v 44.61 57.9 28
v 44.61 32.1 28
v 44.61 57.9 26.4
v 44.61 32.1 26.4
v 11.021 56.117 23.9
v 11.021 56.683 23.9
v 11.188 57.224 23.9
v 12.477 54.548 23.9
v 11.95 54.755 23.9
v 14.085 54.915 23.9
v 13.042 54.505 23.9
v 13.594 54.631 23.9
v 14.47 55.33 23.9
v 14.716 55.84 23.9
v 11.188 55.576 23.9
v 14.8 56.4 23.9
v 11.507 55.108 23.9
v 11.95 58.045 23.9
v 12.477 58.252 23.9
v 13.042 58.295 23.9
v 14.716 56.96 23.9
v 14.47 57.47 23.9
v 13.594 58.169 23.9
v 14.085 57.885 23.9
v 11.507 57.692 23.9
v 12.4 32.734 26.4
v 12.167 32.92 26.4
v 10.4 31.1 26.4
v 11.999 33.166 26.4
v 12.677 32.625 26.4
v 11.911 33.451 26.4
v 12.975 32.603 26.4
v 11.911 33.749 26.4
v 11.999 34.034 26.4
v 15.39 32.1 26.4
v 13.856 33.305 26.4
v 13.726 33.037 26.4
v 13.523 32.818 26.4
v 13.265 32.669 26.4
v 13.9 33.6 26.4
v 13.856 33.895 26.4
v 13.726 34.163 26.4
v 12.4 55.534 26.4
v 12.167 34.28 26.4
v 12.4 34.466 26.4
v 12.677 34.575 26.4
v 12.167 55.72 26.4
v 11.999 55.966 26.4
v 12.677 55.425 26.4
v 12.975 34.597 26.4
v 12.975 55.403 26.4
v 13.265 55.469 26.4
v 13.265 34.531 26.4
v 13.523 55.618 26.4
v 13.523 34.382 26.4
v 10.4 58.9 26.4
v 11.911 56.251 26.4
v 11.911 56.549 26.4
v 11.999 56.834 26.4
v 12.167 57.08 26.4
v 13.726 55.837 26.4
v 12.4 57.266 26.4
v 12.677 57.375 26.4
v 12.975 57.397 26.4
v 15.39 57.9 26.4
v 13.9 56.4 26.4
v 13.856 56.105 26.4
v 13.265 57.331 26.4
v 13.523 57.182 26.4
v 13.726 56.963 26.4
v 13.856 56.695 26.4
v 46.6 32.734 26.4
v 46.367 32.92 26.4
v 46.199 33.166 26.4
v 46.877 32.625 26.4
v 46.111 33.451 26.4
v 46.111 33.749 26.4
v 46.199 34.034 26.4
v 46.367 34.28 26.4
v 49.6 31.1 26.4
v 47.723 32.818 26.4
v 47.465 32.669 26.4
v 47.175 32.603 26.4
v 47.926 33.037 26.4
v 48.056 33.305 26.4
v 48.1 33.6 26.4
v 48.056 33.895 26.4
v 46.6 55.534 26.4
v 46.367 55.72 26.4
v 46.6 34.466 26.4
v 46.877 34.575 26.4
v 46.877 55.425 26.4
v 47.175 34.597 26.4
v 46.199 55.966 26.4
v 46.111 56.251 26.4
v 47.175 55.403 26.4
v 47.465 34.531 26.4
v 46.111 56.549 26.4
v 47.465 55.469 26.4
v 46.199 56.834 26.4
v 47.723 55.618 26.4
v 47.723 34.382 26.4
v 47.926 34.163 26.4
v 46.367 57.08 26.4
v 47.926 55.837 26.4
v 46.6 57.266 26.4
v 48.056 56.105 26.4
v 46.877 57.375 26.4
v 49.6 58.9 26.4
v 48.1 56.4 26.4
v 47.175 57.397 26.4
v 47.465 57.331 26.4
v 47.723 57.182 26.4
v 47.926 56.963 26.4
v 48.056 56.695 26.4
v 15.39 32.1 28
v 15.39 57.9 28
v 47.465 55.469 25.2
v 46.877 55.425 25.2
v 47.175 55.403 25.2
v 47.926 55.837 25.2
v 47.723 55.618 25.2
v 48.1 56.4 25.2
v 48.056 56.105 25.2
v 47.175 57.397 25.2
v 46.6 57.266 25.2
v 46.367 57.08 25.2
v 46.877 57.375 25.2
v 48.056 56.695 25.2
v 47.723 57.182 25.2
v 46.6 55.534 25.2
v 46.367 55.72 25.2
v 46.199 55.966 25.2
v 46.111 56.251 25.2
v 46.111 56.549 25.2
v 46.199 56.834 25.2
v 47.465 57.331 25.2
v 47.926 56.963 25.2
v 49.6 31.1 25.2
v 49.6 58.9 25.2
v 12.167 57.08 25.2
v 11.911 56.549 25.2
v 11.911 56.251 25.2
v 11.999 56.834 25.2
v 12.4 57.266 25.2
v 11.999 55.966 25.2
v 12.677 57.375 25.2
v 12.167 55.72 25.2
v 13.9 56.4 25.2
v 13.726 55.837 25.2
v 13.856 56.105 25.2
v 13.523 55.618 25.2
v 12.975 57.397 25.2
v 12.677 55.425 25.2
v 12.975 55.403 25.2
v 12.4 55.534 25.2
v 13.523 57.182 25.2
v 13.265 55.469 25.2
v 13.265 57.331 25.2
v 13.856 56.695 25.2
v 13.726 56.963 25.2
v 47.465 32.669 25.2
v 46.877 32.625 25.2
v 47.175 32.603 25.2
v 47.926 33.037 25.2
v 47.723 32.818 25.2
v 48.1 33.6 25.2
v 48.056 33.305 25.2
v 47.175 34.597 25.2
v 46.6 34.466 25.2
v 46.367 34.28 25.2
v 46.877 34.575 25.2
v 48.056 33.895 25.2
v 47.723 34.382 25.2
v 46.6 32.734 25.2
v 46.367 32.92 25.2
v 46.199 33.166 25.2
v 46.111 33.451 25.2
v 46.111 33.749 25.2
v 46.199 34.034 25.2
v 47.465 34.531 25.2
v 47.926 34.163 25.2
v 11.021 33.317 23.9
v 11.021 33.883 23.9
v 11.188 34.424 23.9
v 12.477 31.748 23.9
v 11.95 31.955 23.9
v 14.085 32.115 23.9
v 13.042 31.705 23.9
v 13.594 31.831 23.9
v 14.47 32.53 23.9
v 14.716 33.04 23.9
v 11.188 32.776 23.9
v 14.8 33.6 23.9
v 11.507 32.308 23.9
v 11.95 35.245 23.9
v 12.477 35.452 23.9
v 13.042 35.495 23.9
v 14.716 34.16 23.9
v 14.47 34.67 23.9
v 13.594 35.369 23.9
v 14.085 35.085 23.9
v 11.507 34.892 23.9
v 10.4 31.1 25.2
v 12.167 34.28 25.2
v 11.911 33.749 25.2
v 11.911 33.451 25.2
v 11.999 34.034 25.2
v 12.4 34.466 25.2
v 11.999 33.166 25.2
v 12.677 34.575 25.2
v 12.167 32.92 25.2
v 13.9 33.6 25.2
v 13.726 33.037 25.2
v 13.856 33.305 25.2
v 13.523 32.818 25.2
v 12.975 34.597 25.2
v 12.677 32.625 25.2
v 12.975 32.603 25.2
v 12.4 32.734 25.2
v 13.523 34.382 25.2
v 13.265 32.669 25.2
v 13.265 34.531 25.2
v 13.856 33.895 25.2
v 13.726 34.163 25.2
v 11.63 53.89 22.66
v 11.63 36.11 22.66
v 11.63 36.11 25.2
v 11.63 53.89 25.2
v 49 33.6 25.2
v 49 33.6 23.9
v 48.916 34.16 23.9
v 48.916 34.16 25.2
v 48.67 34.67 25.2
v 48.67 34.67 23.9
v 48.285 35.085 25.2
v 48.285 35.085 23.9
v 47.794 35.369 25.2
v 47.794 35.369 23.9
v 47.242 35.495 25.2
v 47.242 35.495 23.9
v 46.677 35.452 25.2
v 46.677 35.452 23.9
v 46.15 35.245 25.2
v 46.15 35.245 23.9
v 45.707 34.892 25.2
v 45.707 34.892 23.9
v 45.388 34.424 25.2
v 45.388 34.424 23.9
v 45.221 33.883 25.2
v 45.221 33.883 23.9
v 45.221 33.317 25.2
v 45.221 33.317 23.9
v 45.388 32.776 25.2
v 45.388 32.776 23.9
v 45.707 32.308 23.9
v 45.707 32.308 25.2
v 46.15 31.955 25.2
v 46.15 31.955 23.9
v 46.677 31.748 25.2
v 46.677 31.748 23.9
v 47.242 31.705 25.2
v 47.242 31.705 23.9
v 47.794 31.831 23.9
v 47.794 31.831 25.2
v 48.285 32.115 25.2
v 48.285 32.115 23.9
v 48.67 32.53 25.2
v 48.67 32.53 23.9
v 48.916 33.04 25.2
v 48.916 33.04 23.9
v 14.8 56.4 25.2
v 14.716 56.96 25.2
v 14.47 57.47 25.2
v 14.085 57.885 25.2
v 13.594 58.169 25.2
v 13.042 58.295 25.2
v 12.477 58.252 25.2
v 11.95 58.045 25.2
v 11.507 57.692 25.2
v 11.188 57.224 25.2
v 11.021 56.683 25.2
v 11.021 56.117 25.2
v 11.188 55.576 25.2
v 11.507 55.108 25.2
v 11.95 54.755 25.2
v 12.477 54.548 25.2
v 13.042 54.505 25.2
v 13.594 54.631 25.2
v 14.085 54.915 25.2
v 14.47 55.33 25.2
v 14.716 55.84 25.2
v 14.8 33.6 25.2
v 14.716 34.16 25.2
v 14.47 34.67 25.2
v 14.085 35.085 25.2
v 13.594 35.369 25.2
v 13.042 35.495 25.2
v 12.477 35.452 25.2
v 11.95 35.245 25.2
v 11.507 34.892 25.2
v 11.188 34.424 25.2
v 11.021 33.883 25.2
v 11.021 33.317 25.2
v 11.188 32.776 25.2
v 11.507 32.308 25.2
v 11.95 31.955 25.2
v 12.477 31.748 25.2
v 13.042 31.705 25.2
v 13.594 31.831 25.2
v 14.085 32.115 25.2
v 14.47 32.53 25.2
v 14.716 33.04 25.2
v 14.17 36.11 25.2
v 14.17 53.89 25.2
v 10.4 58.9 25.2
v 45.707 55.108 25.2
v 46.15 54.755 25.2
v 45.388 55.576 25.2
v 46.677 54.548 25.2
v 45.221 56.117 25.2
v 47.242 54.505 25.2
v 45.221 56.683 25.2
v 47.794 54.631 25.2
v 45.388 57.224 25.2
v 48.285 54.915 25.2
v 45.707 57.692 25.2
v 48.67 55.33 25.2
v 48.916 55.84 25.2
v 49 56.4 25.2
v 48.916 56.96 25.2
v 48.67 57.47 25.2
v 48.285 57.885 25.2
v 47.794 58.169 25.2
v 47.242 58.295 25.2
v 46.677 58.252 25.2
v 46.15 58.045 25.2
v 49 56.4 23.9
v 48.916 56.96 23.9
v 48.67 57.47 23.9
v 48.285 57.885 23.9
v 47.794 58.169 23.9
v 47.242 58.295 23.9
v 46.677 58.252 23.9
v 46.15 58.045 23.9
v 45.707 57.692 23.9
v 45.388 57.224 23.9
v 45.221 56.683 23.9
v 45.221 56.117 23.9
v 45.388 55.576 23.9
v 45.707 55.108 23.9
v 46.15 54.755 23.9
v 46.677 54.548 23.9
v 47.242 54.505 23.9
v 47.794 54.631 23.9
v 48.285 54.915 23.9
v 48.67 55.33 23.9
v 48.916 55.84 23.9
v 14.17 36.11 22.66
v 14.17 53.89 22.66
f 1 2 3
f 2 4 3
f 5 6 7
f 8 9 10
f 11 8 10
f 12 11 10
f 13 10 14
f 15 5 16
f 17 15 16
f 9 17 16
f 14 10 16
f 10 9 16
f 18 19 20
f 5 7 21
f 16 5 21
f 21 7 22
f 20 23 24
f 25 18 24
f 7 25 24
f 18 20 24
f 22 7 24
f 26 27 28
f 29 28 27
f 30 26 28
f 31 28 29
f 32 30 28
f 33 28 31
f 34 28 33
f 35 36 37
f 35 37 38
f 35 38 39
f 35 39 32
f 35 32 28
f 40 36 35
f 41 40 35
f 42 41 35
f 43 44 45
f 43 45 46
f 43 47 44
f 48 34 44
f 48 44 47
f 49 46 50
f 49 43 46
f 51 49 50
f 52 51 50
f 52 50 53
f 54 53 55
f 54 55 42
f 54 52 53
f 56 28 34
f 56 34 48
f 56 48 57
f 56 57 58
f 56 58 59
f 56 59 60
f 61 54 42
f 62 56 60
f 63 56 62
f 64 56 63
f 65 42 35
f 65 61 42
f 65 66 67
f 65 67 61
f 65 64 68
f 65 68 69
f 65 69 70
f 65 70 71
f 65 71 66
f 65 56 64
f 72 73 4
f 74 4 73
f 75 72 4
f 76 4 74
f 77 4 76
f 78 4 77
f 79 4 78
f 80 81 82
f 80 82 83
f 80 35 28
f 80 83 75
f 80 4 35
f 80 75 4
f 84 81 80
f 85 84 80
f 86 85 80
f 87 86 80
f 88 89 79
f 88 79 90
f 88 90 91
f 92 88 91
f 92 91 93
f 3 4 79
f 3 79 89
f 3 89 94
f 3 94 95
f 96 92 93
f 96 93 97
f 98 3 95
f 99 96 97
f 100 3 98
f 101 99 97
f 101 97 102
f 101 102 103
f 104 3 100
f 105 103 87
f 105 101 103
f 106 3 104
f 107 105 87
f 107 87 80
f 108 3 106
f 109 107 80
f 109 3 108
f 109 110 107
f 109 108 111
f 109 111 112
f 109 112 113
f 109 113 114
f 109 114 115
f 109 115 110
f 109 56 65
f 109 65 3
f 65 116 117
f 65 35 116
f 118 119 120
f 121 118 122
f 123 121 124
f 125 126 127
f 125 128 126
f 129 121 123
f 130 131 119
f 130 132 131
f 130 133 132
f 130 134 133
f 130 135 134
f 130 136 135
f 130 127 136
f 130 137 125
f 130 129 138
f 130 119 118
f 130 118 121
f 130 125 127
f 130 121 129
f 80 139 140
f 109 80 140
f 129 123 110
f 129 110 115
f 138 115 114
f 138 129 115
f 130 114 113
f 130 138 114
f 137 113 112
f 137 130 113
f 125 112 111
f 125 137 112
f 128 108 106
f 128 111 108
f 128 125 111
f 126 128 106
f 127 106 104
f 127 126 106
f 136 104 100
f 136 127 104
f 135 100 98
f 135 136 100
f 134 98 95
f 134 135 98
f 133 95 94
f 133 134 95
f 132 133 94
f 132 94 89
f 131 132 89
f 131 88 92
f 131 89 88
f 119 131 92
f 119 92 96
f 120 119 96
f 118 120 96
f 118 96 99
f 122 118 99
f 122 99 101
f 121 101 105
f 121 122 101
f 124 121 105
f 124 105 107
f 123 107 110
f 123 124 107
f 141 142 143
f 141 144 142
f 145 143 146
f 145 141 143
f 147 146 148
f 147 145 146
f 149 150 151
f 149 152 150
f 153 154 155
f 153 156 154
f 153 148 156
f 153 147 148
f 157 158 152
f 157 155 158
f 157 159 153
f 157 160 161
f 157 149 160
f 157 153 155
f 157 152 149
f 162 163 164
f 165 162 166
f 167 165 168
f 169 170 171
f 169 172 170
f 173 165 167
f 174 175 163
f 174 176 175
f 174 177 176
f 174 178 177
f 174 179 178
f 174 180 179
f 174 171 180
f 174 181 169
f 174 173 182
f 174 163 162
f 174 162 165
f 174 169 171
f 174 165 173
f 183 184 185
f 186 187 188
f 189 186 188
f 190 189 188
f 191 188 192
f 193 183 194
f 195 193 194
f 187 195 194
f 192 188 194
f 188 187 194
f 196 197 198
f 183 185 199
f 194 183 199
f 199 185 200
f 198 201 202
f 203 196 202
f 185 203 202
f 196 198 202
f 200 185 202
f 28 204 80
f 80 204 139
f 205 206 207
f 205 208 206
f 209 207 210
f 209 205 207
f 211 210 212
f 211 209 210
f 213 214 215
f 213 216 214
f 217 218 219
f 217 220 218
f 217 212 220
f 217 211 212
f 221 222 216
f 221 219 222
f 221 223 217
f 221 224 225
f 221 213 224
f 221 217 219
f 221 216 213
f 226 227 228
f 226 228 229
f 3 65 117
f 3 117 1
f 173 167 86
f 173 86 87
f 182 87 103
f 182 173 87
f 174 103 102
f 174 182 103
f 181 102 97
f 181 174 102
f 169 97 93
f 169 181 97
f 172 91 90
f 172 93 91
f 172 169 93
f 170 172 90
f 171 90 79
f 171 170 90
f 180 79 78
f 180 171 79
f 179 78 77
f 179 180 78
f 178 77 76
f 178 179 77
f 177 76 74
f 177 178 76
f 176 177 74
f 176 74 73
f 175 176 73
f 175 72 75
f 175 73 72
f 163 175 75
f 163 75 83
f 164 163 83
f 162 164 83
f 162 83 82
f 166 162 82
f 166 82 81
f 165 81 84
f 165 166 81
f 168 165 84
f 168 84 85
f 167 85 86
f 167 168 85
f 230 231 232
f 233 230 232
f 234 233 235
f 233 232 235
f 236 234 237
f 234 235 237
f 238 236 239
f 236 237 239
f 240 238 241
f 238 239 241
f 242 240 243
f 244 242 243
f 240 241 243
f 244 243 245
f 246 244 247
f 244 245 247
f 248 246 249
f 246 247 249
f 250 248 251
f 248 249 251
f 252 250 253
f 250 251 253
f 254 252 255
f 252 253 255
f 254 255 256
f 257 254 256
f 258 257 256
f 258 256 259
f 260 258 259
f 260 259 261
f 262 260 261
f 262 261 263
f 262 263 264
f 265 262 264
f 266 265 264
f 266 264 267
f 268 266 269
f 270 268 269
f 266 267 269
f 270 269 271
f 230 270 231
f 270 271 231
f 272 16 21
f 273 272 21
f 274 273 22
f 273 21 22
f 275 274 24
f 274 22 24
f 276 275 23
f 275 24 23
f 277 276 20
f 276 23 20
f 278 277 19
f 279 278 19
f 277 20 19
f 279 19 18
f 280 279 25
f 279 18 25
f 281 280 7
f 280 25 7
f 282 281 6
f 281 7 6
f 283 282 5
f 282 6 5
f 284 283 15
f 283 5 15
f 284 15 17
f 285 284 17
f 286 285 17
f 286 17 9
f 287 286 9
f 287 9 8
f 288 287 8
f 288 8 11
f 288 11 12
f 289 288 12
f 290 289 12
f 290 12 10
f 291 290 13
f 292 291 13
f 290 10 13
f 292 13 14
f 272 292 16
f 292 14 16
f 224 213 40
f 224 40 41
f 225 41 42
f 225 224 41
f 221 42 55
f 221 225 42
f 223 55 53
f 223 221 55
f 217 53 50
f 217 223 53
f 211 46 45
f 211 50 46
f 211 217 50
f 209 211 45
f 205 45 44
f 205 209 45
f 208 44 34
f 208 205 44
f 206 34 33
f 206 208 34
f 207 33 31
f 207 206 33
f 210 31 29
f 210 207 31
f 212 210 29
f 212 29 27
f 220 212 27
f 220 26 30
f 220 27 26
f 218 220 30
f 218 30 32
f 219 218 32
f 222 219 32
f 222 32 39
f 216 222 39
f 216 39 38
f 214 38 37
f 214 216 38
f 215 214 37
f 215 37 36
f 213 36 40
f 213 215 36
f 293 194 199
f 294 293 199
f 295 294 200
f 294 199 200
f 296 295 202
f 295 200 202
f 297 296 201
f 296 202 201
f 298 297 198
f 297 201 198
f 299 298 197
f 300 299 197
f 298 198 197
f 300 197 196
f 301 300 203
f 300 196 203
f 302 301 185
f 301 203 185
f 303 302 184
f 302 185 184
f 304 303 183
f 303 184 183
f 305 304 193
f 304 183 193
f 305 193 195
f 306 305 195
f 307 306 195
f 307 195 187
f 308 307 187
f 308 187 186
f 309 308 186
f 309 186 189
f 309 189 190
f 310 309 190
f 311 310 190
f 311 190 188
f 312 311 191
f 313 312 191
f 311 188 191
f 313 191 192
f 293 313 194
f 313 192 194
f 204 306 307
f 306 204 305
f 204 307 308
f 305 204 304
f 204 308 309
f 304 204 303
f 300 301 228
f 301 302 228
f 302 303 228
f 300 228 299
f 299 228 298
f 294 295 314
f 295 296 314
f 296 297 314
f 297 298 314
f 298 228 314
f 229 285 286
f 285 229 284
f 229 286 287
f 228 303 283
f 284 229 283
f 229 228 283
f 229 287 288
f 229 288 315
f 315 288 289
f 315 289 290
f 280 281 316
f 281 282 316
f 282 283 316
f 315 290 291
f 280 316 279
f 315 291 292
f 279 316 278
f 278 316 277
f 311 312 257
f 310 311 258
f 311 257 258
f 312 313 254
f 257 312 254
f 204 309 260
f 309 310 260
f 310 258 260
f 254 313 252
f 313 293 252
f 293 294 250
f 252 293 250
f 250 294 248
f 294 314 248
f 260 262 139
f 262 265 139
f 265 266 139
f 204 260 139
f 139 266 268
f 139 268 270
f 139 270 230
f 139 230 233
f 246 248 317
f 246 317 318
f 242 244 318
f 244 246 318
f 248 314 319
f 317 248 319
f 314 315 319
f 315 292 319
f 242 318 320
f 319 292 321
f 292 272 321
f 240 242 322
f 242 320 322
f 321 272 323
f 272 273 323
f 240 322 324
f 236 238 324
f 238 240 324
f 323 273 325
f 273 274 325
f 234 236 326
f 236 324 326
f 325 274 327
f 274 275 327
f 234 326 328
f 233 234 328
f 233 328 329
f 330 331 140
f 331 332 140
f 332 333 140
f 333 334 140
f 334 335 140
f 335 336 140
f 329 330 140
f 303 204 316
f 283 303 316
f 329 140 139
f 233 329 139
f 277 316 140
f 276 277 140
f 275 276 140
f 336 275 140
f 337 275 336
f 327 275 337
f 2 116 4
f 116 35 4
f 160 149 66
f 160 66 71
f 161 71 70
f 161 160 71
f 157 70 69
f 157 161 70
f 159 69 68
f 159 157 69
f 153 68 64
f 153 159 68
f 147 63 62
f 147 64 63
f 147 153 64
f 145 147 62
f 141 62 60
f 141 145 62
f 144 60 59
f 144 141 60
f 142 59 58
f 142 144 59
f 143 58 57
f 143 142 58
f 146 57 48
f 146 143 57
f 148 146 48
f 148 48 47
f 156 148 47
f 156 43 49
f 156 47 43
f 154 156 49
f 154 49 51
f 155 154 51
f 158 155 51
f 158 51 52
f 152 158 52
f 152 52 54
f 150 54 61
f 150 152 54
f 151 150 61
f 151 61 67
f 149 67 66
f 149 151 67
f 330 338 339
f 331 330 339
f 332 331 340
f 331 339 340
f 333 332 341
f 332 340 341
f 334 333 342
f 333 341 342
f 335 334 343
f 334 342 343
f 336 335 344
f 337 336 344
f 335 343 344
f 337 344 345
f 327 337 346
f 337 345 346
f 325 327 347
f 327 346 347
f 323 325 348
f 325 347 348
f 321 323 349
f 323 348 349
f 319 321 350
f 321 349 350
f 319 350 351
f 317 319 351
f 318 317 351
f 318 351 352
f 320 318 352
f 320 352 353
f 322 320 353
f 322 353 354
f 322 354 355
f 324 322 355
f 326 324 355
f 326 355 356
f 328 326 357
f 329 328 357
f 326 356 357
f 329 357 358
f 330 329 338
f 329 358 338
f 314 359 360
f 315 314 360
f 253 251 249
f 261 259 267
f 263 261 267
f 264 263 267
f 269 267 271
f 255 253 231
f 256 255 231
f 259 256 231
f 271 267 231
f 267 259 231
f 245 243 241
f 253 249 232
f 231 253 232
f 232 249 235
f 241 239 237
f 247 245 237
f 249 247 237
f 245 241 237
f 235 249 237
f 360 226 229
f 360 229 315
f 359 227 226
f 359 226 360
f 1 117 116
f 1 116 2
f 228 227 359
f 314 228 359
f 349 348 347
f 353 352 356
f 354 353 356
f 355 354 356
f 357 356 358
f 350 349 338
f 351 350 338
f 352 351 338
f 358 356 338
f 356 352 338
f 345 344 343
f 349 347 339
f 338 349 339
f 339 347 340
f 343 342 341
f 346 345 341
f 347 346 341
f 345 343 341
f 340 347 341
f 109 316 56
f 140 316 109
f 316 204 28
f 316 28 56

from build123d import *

# Parameters (mm, degrees)
MODULE_START                                    = 25.2
SKETCH_1_W                                      = 39.2
SKETCH_1_H                                      = 27.8
MODULE_PCB_DEPTH                                = 1.2
BACKLIGHT_START                                 = 26.4
SKETCH_2_W                                      = 29.22
SKETCH_2_H                                      = 25.8
BACKLIGHT_FRAME_DEPTH                           = 1
GLASS_START                                     = 27.4
SKETCH_3_W                                      = 29.22
SKETCH_3_H                                      = 25.8
GLASS_DEPTH                                     = 0.6
F_7_PIN_START                                   = 22.66
SKETCH_4_W                                      = 2.54
SKETCH_4_H                                      = 17.78
F_7_PIN_HEADER_PLASTIC_ON_THE_MODULE_BACK_DEPTH = 2.54
SKETCH_5_R                                      = 1
CORNER_HOLES_DEPTH                              = 82.935157289
M2_START                                        = 23.9
SKETCH_6_R                                      = 1.9
M2_SCREW_HEAD_DEPTH                             = 1.3
EXTRUDE_START                                   = 23.9
SKETCH_7_R                                      = 1.9
EXTRUDE_6_DEPTH                                 = 1.3
SKETCH_8_R                                      = 1.9
EXTRUDE_7_DEPTH                                 = 1.3
SKETCH_9_R                                      = 1.9
EXTRUDE_8_DEPTH                                 = 1.3


with BuildPart() as part:
    # 草圖1 → module PCB (new body)
    with BuildSketch(Plane.XY.offset(MODULE_START)):
        with Locations((30, 45)):
            Rectangle(SKETCH_1_W, SKETCH_1_H)
    extrude(amount=MODULE_PCB_DEPTH)

    # 草圖2 → backlight frame (add)
    with BuildSketch(Plane.XY.offset(BACKLIGHT_START)):
        with Locations((30, 45)):
            Rectangle(SKETCH_2_W, SKETCH_2_H)
    extrude(amount=BACKLIGHT_FRAME_DEPTH)

    # 草圖3 → glass (add)
    with BuildSketch(Plane.XY.offset(GLASS_START)):
        with Locations((30, 45)):
            Rectangle(SKETCH_3_W, SKETCH_3_H)
    extrude(amount=GLASS_DEPTH)

    # 草圖4 → 7-pin header plastic on the module back (add)
    with BuildSketch(Plane.XY.offset(F_7_PIN_START)):
        with Locations((12.9, 45)):
            Rectangle(SKETCH_4_W, SKETCH_4_H)
    extrude(amount=F_7_PIN_HEADER_PLASTIC_ON_THE_MODULE_BACK_DEPTH)

    # 草圖5 → corner holes (cut, through all)
    with BuildSketch(Plane.XY):
        with Locations((12.9, 33.6)):
            Circle(SKETCH_5_R)
        with Locations((12.9, 56.4)):
            Circle(SKETCH_5_R)
        with Locations((47.1, 33.6)):
            Circle(SKETCH_5_R)
        with Locations((47.1, 56.4)):
            Circle(SKETCH_5_R)
    extrude(amount=CORNER_HOLES_DEPTH, mode=Mode.SUBTRACT)

    # 草圖6 → M2 screw head (add)
    with BuildSketch(Plane.XY.offset(M2_START)):
        with Locations((12.9, 33.6)):
            Circle(SKETCH_6_R)
    extrude(amount=M2_SCREW_HEAD_DEPTH)

    # 草圖7 → 填料-伸長6 (add)
    with BuildSketch(Plane.XY.offset(EXTRUDE_START)):
        with Locations((12.9, 56.4)):
            Circle(SKETCH_7_R)
    extrude(amount=EXTRUDE_6_DEPTH)

    # 草圖8 → 填料-伸長7 (add)
    with BuildSketch(Plane.XY.offset(EXTRUDE_START)):
        with Locations((47.1, 33.6)):
            Circle(SKETCH_8_R)
    extrude(amount=EXTRUDE_7_DEPTH)

    # 草圖9 → 填料-伸長8 (add)
    with BuildSketch(Plane.XY.offset(EXTRUDE_START)):
        with Locations((47.1, 56.4)):
            Circle(SKETCH_9_R)
    extrude(amount=EXTRUDE_8_DEPTH)


solid = part.part
